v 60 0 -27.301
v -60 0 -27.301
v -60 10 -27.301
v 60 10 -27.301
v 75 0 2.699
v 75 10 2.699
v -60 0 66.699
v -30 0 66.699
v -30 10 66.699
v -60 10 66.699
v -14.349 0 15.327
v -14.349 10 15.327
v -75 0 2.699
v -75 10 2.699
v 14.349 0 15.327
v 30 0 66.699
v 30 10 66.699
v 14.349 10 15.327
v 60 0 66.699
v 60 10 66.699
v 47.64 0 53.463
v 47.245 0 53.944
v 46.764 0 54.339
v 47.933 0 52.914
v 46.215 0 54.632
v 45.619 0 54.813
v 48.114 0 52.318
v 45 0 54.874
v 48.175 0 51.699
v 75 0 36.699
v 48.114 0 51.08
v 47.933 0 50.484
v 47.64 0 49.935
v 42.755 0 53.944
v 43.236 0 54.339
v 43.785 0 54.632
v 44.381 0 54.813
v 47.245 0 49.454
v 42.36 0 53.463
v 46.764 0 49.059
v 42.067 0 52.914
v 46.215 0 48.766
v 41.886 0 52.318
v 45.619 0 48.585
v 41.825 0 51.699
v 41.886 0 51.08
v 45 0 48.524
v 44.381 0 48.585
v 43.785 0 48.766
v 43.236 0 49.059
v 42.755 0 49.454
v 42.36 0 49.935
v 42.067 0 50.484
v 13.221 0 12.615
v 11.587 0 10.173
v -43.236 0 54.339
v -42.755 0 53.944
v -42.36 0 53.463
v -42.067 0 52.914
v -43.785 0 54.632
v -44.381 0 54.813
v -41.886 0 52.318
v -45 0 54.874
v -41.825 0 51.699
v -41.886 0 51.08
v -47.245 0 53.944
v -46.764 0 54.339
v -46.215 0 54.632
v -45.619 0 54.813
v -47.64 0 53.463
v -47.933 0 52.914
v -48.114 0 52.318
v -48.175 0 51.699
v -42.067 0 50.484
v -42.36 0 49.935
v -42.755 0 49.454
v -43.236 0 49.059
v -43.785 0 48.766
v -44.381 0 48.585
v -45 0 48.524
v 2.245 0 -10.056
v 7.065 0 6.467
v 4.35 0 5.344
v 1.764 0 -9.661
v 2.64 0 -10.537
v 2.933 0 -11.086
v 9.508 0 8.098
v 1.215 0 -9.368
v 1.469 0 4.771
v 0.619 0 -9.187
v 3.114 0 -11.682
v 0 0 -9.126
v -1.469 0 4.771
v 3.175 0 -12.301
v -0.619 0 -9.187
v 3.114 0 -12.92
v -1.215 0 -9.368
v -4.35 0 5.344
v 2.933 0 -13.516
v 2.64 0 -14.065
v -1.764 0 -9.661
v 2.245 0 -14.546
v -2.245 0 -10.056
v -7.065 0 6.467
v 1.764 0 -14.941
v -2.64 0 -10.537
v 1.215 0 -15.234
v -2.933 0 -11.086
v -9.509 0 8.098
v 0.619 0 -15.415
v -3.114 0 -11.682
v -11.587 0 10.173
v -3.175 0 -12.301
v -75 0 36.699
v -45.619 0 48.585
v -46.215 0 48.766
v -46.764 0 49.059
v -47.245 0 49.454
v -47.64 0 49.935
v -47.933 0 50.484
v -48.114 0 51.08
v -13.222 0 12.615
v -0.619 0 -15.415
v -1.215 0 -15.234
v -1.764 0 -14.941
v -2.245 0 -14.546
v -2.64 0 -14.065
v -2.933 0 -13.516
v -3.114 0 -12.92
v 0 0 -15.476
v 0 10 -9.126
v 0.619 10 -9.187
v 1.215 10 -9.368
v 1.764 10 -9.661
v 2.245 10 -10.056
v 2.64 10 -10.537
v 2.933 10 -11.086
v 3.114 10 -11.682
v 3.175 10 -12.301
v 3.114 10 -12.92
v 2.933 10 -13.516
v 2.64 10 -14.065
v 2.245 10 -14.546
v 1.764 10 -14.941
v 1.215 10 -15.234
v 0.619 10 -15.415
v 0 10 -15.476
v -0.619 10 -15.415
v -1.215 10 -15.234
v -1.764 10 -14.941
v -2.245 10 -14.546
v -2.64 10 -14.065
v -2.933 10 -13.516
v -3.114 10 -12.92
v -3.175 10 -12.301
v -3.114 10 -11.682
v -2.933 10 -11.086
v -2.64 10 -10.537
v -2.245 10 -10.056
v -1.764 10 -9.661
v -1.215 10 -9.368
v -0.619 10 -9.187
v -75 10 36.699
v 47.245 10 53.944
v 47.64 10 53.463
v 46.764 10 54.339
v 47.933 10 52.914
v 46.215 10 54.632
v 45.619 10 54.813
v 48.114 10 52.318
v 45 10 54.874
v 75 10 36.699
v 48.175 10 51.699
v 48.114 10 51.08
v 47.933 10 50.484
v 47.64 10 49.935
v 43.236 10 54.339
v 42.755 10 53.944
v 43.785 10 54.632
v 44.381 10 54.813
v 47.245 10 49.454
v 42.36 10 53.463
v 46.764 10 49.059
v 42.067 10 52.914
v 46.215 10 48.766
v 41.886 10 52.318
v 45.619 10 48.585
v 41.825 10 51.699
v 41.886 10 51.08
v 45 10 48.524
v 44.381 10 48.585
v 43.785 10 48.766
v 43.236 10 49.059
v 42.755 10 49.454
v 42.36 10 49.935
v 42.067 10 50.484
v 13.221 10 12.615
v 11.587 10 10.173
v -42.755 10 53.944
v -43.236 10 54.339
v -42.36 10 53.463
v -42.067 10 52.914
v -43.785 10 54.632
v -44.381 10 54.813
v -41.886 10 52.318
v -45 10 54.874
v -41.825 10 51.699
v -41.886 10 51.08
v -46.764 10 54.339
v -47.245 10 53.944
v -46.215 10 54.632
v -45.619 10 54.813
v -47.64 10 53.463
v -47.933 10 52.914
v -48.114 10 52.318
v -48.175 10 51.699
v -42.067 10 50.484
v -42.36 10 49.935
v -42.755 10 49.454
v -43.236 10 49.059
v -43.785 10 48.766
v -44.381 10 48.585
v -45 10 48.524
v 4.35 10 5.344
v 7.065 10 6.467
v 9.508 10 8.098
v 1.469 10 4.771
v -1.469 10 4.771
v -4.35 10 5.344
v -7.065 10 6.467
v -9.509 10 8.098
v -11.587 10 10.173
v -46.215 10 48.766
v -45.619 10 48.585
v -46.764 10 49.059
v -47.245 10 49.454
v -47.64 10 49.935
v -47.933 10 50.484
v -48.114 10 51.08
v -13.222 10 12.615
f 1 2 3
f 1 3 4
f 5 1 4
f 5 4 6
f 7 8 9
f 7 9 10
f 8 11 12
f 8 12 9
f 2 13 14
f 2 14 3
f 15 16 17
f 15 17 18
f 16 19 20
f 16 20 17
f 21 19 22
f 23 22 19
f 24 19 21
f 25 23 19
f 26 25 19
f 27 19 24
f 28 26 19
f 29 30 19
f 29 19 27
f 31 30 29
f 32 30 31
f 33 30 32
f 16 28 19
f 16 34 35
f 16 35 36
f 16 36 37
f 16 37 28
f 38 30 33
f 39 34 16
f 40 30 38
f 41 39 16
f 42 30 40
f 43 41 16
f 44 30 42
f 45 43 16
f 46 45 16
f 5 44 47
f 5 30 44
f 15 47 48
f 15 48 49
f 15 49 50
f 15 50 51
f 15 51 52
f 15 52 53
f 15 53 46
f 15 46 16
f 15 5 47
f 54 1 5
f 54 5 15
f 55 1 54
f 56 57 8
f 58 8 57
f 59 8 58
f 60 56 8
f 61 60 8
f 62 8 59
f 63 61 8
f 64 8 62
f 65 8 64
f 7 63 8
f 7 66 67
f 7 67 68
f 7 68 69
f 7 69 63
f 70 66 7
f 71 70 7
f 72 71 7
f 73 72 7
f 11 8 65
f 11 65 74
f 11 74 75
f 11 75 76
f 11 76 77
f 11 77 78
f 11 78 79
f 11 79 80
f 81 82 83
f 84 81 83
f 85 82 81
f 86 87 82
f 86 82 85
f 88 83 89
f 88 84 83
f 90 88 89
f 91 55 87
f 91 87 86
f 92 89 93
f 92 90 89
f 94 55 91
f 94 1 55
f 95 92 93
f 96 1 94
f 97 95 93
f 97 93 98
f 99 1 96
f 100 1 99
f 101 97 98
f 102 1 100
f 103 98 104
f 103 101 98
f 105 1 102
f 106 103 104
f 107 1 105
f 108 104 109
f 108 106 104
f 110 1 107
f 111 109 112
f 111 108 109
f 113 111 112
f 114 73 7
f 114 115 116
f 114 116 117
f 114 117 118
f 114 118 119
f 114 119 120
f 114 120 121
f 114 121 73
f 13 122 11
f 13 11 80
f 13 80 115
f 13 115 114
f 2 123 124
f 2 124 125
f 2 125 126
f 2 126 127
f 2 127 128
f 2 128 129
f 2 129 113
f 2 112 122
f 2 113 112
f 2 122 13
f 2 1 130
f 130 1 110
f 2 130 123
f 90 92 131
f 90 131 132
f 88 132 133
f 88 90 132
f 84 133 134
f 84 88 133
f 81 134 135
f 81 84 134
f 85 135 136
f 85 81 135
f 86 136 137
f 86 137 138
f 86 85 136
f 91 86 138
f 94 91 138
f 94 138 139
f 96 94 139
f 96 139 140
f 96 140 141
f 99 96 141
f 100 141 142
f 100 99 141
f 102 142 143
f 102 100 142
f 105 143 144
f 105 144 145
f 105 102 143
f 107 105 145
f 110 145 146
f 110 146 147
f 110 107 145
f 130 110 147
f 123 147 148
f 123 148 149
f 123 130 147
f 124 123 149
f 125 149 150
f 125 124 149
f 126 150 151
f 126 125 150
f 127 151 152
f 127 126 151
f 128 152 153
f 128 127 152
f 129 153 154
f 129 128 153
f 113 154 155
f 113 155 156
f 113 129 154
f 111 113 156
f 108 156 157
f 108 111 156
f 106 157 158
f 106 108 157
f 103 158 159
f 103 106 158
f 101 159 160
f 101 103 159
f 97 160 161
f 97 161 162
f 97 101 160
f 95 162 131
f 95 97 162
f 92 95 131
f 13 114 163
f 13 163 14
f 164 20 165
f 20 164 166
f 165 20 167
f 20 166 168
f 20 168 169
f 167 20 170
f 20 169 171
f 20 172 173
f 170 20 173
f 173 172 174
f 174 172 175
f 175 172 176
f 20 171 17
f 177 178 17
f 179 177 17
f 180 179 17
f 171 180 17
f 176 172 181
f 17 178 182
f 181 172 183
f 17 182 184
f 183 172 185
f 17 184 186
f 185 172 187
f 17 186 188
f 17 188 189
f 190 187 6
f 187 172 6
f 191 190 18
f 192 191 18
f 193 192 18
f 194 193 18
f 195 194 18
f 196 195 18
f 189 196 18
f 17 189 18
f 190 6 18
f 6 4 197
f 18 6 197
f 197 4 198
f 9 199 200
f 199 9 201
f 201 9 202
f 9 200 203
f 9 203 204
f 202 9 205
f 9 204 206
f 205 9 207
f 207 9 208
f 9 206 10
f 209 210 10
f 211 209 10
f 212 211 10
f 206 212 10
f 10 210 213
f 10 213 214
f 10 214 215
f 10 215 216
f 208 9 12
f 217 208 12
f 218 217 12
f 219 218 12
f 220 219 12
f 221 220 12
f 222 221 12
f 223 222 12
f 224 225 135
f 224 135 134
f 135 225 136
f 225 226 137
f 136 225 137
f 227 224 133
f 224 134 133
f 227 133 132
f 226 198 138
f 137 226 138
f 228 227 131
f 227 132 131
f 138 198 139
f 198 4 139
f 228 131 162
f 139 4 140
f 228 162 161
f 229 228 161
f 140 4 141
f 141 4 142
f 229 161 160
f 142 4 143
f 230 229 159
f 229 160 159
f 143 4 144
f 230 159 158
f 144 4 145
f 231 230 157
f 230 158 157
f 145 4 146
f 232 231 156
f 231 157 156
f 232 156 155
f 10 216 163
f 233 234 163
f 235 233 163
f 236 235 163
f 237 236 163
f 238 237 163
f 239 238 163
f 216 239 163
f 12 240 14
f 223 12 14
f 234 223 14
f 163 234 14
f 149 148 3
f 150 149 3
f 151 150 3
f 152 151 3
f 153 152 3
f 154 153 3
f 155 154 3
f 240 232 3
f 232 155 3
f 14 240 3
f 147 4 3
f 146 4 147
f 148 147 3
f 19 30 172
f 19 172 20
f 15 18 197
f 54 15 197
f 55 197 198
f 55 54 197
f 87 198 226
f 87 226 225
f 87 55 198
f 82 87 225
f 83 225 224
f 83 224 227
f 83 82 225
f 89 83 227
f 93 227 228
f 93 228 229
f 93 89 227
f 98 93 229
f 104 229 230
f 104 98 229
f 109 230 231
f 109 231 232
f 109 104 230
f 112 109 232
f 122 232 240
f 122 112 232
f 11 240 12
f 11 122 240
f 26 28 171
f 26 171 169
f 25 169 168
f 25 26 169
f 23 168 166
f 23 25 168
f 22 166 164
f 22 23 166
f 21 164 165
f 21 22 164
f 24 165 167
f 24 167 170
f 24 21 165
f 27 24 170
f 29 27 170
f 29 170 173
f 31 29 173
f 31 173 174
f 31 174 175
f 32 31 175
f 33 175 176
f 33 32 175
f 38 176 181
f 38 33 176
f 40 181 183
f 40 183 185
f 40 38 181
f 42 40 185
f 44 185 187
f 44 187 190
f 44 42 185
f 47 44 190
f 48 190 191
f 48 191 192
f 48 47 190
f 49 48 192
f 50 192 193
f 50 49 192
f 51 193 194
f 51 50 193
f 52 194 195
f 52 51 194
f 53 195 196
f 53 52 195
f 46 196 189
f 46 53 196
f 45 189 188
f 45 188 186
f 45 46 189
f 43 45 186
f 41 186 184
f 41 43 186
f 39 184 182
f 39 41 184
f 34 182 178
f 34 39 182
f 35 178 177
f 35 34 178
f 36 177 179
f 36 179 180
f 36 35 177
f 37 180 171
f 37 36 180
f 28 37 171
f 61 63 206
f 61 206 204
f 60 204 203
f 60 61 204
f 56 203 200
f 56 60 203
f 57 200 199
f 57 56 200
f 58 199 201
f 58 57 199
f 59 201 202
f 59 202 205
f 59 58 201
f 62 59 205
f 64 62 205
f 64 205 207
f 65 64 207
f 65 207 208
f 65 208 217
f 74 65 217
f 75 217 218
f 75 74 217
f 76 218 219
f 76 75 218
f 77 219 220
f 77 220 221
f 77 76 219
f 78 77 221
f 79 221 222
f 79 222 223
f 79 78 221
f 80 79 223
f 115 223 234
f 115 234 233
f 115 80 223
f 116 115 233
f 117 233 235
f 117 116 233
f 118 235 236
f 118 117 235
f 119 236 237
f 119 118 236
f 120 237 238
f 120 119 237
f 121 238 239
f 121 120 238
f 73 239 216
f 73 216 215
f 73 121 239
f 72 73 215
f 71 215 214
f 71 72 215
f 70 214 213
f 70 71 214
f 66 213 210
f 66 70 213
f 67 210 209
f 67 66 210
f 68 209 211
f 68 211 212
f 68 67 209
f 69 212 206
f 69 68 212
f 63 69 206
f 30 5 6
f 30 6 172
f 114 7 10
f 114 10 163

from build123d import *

# Parameters (mm, degrees)
SKETCH1_R           = 3.175
BOSS_EXTRUDE1_DEPTH = 10


with BuildPart() as part:
    # Sketch1 → Boss-Extrude1 (new body)
    with BuildSketch(Plane(origin=(0, 0, 0), x_dir=(1, 0, 0), z_dir=(0, 1, 0))):
        with BuildLine():
            Line((-60, 27.300970874), (60, 27.300970874))
            Line((60, 27.300970874), (75, -2.699029126))
            Line((75, -2.699029126), (75, -36.699029126))
            Line((75, -36.699029126), (60, -66.699029126))
            Line((60, -66.699029126), (30, -66.699029126))
            Line((30, -66.699029126), (14.348655784, -15.327387893))
            ThreePointArc((14.348655784, -15.327387893), (-0.000213283, -4.699029126), (-14.34901862, -15.327473931))
            Line((-14.34901862, -15.327473931), (-30, -66.699029126))
            Line((-30, -66.699029126), (-60, -66.699029126))
            Line((-60, -66.699029126), (-75, -36.699029126))
            Line((-75, -36.699029126), (-75, -2.699029126))
            Line((-75, -2.699029126), (-60, 27.300970874))
        make_face()
        with Locations(Location((-45, -51.699029126, 0), (0, 0, 270))):
            Circle(SKETCH1_R, mode=Mode.SUBTRACT)
        with Locations(Location((0, 12.300970874, 0), (0, 0, 270))):
            Circle(SKETCH1_R, mode=Mode.SUBTRACT)
        with Locations(Location((45, -51.699029126, 0), (0, 0, 270))):
            Circle(SKETCH1_R, mode=Mode.SUBTRACT)
    extrude(amount=BOSS_EXTRUDE1_DEPTH)


solid = part.part
